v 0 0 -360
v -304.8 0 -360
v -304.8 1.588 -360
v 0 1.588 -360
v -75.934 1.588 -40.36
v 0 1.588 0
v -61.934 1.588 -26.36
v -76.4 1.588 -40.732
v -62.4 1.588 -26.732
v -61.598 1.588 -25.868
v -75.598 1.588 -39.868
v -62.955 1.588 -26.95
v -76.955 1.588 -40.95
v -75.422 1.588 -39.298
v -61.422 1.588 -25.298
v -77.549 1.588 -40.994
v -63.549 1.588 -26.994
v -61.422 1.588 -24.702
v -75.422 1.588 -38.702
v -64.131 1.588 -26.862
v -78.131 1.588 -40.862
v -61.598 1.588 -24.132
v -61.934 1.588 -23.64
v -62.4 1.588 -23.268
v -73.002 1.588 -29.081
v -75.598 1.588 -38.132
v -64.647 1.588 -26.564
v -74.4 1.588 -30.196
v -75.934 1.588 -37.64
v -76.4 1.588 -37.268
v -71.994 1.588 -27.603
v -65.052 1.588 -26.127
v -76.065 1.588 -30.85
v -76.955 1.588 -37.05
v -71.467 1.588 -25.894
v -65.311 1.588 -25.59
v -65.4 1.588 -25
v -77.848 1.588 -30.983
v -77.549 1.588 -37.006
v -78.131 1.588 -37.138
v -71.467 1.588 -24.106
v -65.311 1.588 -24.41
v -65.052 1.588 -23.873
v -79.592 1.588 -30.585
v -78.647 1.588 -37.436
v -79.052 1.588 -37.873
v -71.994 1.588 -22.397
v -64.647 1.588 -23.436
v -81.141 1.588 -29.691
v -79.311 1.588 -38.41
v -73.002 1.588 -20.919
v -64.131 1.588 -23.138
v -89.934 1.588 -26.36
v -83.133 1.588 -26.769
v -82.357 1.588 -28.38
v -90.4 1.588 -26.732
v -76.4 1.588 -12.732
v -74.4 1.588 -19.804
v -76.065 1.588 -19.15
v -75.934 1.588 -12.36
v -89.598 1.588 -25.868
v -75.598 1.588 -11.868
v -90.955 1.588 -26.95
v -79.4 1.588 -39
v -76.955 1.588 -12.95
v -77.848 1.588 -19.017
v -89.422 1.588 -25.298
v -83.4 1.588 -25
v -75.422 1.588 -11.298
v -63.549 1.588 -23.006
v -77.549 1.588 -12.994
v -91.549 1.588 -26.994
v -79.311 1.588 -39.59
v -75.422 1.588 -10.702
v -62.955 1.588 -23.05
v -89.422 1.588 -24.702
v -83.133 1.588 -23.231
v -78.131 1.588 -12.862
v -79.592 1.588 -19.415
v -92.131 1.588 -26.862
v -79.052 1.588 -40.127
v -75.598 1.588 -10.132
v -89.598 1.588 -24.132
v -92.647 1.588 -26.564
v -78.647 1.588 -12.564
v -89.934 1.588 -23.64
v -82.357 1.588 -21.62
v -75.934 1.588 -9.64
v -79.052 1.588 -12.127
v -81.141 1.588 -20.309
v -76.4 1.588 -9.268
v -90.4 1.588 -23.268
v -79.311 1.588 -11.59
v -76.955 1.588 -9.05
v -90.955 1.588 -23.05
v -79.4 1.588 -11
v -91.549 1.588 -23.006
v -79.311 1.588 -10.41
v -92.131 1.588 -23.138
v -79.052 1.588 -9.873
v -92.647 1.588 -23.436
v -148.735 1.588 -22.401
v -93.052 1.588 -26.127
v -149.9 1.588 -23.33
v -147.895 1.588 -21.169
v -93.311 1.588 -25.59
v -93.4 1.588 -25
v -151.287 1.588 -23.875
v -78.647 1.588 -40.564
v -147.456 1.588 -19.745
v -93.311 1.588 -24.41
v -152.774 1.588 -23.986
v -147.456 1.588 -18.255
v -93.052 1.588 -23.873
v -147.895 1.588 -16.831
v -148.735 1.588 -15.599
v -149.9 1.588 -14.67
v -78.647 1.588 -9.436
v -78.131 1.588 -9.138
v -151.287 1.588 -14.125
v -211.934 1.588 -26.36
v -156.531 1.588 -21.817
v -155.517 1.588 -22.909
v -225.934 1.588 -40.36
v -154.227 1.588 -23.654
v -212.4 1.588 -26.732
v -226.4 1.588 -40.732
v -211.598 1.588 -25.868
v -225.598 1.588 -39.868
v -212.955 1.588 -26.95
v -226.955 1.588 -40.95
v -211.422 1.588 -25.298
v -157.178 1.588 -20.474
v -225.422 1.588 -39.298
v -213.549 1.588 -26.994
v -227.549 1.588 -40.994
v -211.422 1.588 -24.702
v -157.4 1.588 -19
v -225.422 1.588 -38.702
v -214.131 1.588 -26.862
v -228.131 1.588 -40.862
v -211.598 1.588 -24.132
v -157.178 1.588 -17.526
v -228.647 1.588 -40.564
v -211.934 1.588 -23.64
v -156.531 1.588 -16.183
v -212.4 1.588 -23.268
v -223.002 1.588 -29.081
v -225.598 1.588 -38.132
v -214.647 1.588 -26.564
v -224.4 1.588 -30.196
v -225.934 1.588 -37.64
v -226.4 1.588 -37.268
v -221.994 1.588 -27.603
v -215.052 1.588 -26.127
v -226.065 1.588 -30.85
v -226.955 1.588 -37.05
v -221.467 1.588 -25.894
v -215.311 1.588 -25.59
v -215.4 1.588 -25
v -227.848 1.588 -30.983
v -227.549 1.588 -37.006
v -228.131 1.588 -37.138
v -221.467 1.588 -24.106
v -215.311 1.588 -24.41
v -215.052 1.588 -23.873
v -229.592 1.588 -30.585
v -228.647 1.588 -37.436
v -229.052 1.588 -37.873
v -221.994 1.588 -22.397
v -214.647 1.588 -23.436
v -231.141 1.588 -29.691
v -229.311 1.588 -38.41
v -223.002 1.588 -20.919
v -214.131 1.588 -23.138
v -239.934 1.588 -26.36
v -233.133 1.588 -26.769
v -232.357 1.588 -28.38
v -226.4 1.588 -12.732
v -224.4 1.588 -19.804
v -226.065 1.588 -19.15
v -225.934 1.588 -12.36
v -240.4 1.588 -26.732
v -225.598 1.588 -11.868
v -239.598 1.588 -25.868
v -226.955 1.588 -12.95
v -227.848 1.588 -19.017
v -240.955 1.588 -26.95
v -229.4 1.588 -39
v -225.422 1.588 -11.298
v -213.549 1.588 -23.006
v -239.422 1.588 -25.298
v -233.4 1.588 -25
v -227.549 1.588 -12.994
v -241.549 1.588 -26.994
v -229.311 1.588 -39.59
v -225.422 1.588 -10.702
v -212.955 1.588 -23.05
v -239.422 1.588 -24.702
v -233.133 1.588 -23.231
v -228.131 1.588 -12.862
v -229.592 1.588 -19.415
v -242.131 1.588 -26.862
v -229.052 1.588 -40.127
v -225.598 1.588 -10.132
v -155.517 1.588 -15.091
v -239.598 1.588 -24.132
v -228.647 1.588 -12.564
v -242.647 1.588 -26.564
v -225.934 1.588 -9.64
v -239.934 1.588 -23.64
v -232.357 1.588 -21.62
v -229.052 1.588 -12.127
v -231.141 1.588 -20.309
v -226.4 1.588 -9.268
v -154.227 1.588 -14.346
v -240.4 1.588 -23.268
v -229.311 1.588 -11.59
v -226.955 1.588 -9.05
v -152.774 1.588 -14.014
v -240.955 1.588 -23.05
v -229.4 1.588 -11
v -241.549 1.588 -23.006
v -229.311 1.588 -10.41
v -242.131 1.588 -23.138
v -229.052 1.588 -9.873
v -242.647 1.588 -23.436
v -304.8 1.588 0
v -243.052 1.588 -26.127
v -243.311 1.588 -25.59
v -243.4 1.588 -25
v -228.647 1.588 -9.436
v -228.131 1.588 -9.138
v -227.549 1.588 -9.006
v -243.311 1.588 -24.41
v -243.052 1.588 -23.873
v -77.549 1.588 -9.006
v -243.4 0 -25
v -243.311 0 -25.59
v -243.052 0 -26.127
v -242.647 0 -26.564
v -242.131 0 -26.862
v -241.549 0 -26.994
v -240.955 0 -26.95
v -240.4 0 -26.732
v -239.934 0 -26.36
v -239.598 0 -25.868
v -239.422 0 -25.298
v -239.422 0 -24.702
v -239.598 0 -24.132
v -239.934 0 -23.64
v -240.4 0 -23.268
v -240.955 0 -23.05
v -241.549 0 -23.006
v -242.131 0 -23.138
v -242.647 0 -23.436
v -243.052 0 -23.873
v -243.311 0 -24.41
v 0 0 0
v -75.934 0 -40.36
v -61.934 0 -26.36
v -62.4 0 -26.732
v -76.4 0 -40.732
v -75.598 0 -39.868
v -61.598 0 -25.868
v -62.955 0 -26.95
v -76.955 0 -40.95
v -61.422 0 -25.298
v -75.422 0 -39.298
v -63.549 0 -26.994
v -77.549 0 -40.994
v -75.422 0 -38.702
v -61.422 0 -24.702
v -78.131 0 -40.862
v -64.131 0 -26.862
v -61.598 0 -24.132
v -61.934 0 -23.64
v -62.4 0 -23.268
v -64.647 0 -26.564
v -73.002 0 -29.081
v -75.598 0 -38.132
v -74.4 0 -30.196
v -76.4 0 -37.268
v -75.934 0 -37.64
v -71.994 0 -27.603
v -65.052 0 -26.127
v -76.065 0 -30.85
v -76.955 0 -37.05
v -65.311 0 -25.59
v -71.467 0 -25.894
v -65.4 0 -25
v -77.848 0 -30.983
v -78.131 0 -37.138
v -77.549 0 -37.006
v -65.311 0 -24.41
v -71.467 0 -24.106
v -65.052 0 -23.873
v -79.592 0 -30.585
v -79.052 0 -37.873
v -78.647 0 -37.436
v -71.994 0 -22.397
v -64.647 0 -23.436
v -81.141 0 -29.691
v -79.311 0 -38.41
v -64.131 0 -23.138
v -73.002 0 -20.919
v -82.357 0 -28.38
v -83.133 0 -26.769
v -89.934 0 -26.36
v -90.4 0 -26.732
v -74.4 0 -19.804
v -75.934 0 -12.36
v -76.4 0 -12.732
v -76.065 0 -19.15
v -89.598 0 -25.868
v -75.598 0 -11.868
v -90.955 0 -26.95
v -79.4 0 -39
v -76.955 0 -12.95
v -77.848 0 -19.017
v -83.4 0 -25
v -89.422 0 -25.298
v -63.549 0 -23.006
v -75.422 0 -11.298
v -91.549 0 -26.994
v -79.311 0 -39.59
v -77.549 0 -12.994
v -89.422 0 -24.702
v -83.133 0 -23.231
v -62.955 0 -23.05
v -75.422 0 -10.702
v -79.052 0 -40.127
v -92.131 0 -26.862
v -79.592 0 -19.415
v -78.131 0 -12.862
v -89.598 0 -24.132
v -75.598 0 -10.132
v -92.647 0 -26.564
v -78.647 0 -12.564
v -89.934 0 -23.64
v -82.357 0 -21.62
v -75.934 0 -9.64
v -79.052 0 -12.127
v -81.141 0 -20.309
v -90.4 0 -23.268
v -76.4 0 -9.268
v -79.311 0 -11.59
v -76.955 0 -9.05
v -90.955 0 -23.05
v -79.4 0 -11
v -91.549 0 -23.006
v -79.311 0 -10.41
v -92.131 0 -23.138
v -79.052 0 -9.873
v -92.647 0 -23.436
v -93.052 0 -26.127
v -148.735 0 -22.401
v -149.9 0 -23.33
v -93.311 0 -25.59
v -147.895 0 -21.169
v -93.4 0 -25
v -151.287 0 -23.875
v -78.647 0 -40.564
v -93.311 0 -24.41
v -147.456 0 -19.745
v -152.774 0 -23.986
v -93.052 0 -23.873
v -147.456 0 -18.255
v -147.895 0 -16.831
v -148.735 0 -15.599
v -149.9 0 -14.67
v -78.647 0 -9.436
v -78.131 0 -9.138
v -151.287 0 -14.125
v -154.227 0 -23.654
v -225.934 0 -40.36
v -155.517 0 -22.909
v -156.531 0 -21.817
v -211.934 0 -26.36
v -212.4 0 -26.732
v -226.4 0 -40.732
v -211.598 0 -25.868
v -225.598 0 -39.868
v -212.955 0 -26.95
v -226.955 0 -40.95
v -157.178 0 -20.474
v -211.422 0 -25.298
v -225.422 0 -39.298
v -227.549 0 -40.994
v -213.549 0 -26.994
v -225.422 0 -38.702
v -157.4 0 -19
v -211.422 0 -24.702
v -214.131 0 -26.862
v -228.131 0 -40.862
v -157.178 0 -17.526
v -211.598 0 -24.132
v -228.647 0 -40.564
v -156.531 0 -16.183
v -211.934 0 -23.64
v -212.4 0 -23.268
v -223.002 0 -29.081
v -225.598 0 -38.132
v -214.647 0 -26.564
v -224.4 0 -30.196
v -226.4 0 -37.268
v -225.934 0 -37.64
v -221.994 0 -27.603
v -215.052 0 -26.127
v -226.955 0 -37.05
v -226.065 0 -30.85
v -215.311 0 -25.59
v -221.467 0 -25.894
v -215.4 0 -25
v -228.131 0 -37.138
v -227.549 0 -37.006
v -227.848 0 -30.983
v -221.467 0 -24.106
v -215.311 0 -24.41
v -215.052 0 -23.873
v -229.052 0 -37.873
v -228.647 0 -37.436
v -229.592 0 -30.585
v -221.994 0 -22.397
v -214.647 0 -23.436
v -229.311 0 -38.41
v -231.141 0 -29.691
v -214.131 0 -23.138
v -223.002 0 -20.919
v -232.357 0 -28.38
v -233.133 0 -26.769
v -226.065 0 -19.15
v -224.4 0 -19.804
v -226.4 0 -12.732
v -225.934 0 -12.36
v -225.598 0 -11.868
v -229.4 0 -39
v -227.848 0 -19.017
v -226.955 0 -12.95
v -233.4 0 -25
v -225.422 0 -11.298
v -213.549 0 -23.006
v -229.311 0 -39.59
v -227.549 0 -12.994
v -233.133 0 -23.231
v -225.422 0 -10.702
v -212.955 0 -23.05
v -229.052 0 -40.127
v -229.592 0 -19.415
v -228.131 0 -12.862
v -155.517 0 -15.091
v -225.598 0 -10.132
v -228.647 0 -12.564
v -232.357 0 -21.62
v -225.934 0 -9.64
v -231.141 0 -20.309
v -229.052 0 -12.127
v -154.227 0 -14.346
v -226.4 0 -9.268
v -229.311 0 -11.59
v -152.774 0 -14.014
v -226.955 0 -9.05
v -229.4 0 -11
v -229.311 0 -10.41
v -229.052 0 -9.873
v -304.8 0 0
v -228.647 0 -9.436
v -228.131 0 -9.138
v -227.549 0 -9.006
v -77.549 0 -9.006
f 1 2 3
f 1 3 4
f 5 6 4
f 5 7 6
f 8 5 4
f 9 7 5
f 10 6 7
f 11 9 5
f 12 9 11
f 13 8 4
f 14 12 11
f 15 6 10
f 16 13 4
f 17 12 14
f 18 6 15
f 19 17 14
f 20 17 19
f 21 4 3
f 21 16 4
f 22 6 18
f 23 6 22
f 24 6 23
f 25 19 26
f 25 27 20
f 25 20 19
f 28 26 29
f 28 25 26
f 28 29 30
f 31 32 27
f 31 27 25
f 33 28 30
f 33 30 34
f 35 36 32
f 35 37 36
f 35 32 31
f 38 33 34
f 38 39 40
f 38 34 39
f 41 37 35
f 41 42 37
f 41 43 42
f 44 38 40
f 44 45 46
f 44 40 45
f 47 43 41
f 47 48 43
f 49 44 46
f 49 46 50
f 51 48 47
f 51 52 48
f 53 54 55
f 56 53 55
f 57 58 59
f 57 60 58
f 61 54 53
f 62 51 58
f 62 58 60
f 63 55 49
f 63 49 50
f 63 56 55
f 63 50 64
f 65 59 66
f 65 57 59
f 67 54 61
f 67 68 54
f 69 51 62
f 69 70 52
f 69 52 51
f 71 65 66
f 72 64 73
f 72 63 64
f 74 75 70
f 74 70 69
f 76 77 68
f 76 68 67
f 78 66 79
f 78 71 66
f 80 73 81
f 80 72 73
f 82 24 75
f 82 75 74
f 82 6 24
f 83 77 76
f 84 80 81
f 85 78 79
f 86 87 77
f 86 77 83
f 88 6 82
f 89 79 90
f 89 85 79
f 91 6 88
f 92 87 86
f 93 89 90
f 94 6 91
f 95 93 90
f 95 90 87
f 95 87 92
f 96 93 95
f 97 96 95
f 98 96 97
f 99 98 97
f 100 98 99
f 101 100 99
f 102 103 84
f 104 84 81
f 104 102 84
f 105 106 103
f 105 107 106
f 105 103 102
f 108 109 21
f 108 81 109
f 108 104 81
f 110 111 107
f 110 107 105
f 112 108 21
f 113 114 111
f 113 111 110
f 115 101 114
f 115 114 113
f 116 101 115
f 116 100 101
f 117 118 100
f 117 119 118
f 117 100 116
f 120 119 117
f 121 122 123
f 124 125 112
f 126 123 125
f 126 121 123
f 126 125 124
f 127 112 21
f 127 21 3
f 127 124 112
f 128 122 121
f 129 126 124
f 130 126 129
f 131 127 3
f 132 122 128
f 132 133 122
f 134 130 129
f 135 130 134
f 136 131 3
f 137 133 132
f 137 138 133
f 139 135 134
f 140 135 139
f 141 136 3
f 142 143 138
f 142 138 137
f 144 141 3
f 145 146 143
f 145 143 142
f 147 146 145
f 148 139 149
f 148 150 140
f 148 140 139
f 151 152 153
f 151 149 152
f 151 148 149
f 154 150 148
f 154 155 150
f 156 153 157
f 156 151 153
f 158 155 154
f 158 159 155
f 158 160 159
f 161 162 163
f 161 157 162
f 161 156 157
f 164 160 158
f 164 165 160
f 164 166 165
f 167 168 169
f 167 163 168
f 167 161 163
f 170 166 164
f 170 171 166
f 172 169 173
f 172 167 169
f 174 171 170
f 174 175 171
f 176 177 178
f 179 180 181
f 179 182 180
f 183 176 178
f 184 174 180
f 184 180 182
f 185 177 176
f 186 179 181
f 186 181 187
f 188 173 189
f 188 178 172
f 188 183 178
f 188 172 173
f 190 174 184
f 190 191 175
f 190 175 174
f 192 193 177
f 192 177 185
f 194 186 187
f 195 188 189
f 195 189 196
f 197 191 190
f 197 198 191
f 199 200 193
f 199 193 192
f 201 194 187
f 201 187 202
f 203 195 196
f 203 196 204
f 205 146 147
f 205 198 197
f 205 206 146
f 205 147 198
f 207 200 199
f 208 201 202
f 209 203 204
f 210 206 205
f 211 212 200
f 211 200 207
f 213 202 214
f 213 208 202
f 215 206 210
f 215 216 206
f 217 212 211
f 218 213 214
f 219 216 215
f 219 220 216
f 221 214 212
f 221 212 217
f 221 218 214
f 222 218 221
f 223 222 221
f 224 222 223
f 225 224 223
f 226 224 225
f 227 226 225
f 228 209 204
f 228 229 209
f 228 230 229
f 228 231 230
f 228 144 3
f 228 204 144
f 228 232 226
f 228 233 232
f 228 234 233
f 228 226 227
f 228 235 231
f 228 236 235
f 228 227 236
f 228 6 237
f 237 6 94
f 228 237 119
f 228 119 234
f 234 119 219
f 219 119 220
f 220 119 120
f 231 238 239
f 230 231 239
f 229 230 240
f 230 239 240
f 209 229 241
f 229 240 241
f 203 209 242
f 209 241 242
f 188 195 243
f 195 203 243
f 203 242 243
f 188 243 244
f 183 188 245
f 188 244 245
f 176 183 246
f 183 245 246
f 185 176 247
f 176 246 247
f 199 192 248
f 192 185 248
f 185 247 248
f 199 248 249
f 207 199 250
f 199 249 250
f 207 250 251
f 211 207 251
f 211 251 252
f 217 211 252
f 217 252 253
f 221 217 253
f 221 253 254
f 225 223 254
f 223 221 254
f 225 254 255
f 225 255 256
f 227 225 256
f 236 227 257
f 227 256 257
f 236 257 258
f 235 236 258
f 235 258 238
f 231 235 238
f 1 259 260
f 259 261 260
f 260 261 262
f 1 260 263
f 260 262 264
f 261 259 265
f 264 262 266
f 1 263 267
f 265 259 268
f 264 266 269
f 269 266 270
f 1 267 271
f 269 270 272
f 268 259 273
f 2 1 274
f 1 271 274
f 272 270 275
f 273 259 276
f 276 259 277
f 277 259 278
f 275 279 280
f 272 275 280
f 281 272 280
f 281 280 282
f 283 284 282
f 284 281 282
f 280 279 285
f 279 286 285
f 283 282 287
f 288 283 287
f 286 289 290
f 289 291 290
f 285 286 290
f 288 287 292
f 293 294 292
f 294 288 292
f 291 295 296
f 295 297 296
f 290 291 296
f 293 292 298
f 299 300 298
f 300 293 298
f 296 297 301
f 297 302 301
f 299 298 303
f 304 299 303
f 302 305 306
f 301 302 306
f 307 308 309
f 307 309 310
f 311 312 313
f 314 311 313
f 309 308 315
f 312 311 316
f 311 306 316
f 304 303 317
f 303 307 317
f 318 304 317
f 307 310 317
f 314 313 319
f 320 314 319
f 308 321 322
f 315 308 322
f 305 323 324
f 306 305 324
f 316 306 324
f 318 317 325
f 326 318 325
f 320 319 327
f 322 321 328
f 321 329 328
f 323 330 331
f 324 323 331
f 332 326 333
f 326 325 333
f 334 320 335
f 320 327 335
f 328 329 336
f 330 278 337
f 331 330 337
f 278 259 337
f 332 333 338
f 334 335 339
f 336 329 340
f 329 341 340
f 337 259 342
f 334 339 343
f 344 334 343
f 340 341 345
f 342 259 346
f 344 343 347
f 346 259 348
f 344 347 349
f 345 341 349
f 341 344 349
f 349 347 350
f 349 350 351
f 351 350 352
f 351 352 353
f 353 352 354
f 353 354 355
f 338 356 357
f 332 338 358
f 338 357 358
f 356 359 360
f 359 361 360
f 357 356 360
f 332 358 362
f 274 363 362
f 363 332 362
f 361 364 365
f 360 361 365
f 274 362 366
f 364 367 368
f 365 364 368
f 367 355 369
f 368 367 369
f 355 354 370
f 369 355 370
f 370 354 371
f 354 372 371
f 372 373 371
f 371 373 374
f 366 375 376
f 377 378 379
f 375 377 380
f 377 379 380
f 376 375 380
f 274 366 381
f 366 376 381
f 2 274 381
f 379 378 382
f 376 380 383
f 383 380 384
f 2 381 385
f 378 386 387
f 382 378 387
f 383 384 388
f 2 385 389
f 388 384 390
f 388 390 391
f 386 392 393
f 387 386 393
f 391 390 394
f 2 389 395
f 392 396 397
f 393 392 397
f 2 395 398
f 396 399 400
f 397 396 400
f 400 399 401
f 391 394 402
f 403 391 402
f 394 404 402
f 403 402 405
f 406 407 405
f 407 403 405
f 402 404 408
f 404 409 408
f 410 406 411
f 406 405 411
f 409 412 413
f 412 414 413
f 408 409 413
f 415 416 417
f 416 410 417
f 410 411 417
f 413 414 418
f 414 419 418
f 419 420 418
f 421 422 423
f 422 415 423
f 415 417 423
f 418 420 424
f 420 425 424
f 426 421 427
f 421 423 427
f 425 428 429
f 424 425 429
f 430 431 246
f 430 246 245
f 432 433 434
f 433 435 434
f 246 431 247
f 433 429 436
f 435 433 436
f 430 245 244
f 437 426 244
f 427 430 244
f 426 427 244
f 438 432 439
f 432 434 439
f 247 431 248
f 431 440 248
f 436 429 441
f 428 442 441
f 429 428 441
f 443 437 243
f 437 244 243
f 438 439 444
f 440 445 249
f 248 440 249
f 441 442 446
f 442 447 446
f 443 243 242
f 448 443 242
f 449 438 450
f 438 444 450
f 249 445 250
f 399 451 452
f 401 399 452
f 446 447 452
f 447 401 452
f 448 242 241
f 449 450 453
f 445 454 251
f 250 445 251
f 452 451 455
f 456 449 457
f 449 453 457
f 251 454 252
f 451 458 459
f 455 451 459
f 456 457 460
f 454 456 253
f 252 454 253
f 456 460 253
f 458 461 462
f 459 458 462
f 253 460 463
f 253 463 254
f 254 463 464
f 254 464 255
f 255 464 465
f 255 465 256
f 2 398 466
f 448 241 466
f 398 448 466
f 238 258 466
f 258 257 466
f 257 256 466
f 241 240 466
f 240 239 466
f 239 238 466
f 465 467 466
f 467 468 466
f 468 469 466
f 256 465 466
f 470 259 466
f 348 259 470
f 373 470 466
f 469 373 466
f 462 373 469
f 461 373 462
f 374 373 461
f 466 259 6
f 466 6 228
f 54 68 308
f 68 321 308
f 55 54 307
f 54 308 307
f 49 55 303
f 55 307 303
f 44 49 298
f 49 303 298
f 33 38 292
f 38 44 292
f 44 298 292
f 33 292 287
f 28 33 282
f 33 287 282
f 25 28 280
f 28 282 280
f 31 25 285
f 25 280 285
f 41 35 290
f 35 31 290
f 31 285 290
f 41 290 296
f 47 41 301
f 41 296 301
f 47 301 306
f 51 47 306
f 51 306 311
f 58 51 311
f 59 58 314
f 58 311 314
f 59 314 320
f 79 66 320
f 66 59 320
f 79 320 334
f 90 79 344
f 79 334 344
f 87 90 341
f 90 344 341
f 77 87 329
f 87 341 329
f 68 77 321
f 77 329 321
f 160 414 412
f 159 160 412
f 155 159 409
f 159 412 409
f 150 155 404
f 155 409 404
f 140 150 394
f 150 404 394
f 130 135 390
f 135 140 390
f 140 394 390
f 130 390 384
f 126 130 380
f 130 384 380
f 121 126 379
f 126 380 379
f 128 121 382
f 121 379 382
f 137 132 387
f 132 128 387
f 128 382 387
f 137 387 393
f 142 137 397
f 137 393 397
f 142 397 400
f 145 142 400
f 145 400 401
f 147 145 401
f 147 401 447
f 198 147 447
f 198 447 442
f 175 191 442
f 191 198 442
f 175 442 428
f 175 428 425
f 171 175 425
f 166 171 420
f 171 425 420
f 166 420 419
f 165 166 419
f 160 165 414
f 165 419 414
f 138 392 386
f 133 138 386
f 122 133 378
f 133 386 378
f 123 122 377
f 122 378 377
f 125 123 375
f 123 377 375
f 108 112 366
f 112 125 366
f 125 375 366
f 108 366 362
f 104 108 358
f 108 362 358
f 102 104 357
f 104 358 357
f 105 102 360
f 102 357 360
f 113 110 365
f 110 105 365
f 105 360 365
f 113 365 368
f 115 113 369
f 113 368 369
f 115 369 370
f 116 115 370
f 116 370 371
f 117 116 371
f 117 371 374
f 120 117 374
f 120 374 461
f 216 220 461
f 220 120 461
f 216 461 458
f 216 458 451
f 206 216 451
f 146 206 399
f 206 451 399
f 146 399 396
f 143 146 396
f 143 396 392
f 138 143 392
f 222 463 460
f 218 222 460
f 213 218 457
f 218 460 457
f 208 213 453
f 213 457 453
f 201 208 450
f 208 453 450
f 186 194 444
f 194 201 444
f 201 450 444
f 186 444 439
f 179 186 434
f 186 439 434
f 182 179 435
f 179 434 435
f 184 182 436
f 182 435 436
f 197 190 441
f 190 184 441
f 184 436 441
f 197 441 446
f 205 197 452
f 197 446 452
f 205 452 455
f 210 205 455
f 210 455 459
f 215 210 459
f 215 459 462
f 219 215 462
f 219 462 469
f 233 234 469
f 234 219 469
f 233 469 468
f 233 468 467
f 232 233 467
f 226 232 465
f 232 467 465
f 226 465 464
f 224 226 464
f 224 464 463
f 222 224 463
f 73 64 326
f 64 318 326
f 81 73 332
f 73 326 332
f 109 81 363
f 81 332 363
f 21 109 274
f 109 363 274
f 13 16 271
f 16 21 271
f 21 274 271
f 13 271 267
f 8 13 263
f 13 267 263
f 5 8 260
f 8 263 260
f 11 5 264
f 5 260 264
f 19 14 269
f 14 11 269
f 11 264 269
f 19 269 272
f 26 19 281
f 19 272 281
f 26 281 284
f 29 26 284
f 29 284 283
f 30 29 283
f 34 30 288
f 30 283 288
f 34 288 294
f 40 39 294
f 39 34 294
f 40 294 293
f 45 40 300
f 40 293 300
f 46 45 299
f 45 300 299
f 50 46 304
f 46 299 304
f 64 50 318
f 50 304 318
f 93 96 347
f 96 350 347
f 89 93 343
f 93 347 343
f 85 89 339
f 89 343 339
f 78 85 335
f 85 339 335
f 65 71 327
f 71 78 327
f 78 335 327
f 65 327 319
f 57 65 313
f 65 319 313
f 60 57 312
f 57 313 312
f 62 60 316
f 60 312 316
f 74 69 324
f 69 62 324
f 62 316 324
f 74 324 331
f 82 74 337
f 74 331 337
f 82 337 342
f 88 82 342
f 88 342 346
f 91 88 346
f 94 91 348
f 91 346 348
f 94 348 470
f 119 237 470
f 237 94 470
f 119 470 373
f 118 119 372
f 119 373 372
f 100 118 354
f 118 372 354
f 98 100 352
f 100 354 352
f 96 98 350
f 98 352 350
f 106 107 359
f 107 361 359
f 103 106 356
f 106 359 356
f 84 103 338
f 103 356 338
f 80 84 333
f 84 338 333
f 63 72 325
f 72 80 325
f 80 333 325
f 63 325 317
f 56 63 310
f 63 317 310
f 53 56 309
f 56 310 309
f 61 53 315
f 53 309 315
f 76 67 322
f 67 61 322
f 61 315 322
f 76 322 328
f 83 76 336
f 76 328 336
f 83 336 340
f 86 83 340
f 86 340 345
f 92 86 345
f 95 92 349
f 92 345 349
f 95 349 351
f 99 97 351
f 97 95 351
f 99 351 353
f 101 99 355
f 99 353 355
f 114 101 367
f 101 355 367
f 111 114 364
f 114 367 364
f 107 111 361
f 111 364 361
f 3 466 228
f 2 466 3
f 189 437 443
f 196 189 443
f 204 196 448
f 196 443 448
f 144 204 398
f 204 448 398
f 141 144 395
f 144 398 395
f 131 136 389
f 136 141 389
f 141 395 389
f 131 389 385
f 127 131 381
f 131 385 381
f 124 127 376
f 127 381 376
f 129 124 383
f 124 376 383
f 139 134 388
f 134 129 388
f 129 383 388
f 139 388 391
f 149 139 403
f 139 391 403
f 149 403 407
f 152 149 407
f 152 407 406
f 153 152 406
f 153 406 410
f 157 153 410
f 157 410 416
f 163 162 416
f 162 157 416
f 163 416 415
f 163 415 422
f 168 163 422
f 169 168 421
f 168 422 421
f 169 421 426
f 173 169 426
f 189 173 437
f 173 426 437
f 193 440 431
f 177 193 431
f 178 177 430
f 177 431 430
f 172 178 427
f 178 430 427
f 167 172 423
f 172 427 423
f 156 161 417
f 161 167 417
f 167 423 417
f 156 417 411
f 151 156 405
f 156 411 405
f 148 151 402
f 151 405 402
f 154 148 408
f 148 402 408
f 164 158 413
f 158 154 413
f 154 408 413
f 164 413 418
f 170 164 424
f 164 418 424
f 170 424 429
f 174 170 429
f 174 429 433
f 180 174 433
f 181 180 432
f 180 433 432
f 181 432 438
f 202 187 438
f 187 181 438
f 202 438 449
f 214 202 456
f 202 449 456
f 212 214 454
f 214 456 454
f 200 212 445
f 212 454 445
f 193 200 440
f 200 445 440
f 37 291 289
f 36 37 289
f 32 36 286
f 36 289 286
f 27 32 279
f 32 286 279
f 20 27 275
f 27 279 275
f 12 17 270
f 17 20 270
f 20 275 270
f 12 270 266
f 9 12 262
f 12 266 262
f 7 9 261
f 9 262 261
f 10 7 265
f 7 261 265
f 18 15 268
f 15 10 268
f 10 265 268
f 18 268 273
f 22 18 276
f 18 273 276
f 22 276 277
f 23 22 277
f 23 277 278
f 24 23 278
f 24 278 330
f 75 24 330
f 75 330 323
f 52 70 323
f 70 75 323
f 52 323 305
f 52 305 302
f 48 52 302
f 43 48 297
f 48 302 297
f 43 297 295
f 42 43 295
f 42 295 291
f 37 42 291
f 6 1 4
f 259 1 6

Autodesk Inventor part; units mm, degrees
ref_plane "YZ Plane" through (0, 0, 0) normal (1, 0, 0) x (0, 1, 0)
ref_plane "XZ Plane" through (0, 0, 0) normal (0, 1, 0) x (-1, 0, 0)
ref_plane "XY Plane" through (0, 0, 0) normal (0, 0, 1) x (1, 0, 0)
sketch "Sketch9" plane through (0, 0, 0) normal (0, 1, 0) x (-1, 0, 0)
  line L0 (0, 0) -> (304.8, 0)
  line L1 (304.8, 0) -> (304.8, -360)
  line L2 (304.8, -360) -> (0, -360)
  line L3 (0, -360) -> (0, 0)
  line L4 (152.4, 0) -> (152.4, -19) construction
  circle A0 centre (152.4, -19) radius 5
  line L5 (20.9546, -25) -> (290.8502, -25) construction
  line L6 (152.4, 0) -> (227.4, 0) construction
  line L7 (227.4, -43.4011) -> (227.4, 0) construction
  line L8 (152.4, 0) -> (77.4, 0) construction
  line L9 (77.4, -41.0151) -> (77.4, 0) construction
  circle A1 centre (77.4, -25) radius 6
  circle A2 centre (227.4, -25) radius 6
  circle A3 centre (77.4, -25) radius 14 construction
  circle A4 centre (77.4, -11) radius 2
  circle A5 centre (91.4, -25) radius 2
  circle A6 centre (77.4, -39) radius 2
  circle A7 centre (63.4, -25) radius 2
  circle A8 centre (227.4, -25) radius 14 construction
  circle A9 centre (227.4, -11) radius 2
  circle A10 centre (241.4, -25) radius 2
  circle A11 centre (227.4, -39) radius 2
  circle A12 centre (213.4, -25) radius 2
  dimension "d22" = 304.8
  dimension "d23" = 360
  dimension "d24" = 19
  dimension "d25" = 10
  dimension "d27" = 12
  dimension "d28" = 12
  dimension "d30" = 28
  dimension "d31" = 4
  dimension "d32" = 4
  dimension "d33" = 4
  dimension "d34" = 4
  dimension "d35" = 75
  dimension "d36" = 11
  dimension "d37" = 77.4
  dimension "d38" = 25
  dimension "d39" = 28
  dimension "d40" = 4
  dimension "d41" = 4
  dimension "d42" = 4
  dimension "d43" = 4
  dimension "d44" = 11
extrude "Extrusion5" add sketch "Sketch9" along normal blind 1.5875
properties part number "prototype build plate small" material "Aluminum 6061"
